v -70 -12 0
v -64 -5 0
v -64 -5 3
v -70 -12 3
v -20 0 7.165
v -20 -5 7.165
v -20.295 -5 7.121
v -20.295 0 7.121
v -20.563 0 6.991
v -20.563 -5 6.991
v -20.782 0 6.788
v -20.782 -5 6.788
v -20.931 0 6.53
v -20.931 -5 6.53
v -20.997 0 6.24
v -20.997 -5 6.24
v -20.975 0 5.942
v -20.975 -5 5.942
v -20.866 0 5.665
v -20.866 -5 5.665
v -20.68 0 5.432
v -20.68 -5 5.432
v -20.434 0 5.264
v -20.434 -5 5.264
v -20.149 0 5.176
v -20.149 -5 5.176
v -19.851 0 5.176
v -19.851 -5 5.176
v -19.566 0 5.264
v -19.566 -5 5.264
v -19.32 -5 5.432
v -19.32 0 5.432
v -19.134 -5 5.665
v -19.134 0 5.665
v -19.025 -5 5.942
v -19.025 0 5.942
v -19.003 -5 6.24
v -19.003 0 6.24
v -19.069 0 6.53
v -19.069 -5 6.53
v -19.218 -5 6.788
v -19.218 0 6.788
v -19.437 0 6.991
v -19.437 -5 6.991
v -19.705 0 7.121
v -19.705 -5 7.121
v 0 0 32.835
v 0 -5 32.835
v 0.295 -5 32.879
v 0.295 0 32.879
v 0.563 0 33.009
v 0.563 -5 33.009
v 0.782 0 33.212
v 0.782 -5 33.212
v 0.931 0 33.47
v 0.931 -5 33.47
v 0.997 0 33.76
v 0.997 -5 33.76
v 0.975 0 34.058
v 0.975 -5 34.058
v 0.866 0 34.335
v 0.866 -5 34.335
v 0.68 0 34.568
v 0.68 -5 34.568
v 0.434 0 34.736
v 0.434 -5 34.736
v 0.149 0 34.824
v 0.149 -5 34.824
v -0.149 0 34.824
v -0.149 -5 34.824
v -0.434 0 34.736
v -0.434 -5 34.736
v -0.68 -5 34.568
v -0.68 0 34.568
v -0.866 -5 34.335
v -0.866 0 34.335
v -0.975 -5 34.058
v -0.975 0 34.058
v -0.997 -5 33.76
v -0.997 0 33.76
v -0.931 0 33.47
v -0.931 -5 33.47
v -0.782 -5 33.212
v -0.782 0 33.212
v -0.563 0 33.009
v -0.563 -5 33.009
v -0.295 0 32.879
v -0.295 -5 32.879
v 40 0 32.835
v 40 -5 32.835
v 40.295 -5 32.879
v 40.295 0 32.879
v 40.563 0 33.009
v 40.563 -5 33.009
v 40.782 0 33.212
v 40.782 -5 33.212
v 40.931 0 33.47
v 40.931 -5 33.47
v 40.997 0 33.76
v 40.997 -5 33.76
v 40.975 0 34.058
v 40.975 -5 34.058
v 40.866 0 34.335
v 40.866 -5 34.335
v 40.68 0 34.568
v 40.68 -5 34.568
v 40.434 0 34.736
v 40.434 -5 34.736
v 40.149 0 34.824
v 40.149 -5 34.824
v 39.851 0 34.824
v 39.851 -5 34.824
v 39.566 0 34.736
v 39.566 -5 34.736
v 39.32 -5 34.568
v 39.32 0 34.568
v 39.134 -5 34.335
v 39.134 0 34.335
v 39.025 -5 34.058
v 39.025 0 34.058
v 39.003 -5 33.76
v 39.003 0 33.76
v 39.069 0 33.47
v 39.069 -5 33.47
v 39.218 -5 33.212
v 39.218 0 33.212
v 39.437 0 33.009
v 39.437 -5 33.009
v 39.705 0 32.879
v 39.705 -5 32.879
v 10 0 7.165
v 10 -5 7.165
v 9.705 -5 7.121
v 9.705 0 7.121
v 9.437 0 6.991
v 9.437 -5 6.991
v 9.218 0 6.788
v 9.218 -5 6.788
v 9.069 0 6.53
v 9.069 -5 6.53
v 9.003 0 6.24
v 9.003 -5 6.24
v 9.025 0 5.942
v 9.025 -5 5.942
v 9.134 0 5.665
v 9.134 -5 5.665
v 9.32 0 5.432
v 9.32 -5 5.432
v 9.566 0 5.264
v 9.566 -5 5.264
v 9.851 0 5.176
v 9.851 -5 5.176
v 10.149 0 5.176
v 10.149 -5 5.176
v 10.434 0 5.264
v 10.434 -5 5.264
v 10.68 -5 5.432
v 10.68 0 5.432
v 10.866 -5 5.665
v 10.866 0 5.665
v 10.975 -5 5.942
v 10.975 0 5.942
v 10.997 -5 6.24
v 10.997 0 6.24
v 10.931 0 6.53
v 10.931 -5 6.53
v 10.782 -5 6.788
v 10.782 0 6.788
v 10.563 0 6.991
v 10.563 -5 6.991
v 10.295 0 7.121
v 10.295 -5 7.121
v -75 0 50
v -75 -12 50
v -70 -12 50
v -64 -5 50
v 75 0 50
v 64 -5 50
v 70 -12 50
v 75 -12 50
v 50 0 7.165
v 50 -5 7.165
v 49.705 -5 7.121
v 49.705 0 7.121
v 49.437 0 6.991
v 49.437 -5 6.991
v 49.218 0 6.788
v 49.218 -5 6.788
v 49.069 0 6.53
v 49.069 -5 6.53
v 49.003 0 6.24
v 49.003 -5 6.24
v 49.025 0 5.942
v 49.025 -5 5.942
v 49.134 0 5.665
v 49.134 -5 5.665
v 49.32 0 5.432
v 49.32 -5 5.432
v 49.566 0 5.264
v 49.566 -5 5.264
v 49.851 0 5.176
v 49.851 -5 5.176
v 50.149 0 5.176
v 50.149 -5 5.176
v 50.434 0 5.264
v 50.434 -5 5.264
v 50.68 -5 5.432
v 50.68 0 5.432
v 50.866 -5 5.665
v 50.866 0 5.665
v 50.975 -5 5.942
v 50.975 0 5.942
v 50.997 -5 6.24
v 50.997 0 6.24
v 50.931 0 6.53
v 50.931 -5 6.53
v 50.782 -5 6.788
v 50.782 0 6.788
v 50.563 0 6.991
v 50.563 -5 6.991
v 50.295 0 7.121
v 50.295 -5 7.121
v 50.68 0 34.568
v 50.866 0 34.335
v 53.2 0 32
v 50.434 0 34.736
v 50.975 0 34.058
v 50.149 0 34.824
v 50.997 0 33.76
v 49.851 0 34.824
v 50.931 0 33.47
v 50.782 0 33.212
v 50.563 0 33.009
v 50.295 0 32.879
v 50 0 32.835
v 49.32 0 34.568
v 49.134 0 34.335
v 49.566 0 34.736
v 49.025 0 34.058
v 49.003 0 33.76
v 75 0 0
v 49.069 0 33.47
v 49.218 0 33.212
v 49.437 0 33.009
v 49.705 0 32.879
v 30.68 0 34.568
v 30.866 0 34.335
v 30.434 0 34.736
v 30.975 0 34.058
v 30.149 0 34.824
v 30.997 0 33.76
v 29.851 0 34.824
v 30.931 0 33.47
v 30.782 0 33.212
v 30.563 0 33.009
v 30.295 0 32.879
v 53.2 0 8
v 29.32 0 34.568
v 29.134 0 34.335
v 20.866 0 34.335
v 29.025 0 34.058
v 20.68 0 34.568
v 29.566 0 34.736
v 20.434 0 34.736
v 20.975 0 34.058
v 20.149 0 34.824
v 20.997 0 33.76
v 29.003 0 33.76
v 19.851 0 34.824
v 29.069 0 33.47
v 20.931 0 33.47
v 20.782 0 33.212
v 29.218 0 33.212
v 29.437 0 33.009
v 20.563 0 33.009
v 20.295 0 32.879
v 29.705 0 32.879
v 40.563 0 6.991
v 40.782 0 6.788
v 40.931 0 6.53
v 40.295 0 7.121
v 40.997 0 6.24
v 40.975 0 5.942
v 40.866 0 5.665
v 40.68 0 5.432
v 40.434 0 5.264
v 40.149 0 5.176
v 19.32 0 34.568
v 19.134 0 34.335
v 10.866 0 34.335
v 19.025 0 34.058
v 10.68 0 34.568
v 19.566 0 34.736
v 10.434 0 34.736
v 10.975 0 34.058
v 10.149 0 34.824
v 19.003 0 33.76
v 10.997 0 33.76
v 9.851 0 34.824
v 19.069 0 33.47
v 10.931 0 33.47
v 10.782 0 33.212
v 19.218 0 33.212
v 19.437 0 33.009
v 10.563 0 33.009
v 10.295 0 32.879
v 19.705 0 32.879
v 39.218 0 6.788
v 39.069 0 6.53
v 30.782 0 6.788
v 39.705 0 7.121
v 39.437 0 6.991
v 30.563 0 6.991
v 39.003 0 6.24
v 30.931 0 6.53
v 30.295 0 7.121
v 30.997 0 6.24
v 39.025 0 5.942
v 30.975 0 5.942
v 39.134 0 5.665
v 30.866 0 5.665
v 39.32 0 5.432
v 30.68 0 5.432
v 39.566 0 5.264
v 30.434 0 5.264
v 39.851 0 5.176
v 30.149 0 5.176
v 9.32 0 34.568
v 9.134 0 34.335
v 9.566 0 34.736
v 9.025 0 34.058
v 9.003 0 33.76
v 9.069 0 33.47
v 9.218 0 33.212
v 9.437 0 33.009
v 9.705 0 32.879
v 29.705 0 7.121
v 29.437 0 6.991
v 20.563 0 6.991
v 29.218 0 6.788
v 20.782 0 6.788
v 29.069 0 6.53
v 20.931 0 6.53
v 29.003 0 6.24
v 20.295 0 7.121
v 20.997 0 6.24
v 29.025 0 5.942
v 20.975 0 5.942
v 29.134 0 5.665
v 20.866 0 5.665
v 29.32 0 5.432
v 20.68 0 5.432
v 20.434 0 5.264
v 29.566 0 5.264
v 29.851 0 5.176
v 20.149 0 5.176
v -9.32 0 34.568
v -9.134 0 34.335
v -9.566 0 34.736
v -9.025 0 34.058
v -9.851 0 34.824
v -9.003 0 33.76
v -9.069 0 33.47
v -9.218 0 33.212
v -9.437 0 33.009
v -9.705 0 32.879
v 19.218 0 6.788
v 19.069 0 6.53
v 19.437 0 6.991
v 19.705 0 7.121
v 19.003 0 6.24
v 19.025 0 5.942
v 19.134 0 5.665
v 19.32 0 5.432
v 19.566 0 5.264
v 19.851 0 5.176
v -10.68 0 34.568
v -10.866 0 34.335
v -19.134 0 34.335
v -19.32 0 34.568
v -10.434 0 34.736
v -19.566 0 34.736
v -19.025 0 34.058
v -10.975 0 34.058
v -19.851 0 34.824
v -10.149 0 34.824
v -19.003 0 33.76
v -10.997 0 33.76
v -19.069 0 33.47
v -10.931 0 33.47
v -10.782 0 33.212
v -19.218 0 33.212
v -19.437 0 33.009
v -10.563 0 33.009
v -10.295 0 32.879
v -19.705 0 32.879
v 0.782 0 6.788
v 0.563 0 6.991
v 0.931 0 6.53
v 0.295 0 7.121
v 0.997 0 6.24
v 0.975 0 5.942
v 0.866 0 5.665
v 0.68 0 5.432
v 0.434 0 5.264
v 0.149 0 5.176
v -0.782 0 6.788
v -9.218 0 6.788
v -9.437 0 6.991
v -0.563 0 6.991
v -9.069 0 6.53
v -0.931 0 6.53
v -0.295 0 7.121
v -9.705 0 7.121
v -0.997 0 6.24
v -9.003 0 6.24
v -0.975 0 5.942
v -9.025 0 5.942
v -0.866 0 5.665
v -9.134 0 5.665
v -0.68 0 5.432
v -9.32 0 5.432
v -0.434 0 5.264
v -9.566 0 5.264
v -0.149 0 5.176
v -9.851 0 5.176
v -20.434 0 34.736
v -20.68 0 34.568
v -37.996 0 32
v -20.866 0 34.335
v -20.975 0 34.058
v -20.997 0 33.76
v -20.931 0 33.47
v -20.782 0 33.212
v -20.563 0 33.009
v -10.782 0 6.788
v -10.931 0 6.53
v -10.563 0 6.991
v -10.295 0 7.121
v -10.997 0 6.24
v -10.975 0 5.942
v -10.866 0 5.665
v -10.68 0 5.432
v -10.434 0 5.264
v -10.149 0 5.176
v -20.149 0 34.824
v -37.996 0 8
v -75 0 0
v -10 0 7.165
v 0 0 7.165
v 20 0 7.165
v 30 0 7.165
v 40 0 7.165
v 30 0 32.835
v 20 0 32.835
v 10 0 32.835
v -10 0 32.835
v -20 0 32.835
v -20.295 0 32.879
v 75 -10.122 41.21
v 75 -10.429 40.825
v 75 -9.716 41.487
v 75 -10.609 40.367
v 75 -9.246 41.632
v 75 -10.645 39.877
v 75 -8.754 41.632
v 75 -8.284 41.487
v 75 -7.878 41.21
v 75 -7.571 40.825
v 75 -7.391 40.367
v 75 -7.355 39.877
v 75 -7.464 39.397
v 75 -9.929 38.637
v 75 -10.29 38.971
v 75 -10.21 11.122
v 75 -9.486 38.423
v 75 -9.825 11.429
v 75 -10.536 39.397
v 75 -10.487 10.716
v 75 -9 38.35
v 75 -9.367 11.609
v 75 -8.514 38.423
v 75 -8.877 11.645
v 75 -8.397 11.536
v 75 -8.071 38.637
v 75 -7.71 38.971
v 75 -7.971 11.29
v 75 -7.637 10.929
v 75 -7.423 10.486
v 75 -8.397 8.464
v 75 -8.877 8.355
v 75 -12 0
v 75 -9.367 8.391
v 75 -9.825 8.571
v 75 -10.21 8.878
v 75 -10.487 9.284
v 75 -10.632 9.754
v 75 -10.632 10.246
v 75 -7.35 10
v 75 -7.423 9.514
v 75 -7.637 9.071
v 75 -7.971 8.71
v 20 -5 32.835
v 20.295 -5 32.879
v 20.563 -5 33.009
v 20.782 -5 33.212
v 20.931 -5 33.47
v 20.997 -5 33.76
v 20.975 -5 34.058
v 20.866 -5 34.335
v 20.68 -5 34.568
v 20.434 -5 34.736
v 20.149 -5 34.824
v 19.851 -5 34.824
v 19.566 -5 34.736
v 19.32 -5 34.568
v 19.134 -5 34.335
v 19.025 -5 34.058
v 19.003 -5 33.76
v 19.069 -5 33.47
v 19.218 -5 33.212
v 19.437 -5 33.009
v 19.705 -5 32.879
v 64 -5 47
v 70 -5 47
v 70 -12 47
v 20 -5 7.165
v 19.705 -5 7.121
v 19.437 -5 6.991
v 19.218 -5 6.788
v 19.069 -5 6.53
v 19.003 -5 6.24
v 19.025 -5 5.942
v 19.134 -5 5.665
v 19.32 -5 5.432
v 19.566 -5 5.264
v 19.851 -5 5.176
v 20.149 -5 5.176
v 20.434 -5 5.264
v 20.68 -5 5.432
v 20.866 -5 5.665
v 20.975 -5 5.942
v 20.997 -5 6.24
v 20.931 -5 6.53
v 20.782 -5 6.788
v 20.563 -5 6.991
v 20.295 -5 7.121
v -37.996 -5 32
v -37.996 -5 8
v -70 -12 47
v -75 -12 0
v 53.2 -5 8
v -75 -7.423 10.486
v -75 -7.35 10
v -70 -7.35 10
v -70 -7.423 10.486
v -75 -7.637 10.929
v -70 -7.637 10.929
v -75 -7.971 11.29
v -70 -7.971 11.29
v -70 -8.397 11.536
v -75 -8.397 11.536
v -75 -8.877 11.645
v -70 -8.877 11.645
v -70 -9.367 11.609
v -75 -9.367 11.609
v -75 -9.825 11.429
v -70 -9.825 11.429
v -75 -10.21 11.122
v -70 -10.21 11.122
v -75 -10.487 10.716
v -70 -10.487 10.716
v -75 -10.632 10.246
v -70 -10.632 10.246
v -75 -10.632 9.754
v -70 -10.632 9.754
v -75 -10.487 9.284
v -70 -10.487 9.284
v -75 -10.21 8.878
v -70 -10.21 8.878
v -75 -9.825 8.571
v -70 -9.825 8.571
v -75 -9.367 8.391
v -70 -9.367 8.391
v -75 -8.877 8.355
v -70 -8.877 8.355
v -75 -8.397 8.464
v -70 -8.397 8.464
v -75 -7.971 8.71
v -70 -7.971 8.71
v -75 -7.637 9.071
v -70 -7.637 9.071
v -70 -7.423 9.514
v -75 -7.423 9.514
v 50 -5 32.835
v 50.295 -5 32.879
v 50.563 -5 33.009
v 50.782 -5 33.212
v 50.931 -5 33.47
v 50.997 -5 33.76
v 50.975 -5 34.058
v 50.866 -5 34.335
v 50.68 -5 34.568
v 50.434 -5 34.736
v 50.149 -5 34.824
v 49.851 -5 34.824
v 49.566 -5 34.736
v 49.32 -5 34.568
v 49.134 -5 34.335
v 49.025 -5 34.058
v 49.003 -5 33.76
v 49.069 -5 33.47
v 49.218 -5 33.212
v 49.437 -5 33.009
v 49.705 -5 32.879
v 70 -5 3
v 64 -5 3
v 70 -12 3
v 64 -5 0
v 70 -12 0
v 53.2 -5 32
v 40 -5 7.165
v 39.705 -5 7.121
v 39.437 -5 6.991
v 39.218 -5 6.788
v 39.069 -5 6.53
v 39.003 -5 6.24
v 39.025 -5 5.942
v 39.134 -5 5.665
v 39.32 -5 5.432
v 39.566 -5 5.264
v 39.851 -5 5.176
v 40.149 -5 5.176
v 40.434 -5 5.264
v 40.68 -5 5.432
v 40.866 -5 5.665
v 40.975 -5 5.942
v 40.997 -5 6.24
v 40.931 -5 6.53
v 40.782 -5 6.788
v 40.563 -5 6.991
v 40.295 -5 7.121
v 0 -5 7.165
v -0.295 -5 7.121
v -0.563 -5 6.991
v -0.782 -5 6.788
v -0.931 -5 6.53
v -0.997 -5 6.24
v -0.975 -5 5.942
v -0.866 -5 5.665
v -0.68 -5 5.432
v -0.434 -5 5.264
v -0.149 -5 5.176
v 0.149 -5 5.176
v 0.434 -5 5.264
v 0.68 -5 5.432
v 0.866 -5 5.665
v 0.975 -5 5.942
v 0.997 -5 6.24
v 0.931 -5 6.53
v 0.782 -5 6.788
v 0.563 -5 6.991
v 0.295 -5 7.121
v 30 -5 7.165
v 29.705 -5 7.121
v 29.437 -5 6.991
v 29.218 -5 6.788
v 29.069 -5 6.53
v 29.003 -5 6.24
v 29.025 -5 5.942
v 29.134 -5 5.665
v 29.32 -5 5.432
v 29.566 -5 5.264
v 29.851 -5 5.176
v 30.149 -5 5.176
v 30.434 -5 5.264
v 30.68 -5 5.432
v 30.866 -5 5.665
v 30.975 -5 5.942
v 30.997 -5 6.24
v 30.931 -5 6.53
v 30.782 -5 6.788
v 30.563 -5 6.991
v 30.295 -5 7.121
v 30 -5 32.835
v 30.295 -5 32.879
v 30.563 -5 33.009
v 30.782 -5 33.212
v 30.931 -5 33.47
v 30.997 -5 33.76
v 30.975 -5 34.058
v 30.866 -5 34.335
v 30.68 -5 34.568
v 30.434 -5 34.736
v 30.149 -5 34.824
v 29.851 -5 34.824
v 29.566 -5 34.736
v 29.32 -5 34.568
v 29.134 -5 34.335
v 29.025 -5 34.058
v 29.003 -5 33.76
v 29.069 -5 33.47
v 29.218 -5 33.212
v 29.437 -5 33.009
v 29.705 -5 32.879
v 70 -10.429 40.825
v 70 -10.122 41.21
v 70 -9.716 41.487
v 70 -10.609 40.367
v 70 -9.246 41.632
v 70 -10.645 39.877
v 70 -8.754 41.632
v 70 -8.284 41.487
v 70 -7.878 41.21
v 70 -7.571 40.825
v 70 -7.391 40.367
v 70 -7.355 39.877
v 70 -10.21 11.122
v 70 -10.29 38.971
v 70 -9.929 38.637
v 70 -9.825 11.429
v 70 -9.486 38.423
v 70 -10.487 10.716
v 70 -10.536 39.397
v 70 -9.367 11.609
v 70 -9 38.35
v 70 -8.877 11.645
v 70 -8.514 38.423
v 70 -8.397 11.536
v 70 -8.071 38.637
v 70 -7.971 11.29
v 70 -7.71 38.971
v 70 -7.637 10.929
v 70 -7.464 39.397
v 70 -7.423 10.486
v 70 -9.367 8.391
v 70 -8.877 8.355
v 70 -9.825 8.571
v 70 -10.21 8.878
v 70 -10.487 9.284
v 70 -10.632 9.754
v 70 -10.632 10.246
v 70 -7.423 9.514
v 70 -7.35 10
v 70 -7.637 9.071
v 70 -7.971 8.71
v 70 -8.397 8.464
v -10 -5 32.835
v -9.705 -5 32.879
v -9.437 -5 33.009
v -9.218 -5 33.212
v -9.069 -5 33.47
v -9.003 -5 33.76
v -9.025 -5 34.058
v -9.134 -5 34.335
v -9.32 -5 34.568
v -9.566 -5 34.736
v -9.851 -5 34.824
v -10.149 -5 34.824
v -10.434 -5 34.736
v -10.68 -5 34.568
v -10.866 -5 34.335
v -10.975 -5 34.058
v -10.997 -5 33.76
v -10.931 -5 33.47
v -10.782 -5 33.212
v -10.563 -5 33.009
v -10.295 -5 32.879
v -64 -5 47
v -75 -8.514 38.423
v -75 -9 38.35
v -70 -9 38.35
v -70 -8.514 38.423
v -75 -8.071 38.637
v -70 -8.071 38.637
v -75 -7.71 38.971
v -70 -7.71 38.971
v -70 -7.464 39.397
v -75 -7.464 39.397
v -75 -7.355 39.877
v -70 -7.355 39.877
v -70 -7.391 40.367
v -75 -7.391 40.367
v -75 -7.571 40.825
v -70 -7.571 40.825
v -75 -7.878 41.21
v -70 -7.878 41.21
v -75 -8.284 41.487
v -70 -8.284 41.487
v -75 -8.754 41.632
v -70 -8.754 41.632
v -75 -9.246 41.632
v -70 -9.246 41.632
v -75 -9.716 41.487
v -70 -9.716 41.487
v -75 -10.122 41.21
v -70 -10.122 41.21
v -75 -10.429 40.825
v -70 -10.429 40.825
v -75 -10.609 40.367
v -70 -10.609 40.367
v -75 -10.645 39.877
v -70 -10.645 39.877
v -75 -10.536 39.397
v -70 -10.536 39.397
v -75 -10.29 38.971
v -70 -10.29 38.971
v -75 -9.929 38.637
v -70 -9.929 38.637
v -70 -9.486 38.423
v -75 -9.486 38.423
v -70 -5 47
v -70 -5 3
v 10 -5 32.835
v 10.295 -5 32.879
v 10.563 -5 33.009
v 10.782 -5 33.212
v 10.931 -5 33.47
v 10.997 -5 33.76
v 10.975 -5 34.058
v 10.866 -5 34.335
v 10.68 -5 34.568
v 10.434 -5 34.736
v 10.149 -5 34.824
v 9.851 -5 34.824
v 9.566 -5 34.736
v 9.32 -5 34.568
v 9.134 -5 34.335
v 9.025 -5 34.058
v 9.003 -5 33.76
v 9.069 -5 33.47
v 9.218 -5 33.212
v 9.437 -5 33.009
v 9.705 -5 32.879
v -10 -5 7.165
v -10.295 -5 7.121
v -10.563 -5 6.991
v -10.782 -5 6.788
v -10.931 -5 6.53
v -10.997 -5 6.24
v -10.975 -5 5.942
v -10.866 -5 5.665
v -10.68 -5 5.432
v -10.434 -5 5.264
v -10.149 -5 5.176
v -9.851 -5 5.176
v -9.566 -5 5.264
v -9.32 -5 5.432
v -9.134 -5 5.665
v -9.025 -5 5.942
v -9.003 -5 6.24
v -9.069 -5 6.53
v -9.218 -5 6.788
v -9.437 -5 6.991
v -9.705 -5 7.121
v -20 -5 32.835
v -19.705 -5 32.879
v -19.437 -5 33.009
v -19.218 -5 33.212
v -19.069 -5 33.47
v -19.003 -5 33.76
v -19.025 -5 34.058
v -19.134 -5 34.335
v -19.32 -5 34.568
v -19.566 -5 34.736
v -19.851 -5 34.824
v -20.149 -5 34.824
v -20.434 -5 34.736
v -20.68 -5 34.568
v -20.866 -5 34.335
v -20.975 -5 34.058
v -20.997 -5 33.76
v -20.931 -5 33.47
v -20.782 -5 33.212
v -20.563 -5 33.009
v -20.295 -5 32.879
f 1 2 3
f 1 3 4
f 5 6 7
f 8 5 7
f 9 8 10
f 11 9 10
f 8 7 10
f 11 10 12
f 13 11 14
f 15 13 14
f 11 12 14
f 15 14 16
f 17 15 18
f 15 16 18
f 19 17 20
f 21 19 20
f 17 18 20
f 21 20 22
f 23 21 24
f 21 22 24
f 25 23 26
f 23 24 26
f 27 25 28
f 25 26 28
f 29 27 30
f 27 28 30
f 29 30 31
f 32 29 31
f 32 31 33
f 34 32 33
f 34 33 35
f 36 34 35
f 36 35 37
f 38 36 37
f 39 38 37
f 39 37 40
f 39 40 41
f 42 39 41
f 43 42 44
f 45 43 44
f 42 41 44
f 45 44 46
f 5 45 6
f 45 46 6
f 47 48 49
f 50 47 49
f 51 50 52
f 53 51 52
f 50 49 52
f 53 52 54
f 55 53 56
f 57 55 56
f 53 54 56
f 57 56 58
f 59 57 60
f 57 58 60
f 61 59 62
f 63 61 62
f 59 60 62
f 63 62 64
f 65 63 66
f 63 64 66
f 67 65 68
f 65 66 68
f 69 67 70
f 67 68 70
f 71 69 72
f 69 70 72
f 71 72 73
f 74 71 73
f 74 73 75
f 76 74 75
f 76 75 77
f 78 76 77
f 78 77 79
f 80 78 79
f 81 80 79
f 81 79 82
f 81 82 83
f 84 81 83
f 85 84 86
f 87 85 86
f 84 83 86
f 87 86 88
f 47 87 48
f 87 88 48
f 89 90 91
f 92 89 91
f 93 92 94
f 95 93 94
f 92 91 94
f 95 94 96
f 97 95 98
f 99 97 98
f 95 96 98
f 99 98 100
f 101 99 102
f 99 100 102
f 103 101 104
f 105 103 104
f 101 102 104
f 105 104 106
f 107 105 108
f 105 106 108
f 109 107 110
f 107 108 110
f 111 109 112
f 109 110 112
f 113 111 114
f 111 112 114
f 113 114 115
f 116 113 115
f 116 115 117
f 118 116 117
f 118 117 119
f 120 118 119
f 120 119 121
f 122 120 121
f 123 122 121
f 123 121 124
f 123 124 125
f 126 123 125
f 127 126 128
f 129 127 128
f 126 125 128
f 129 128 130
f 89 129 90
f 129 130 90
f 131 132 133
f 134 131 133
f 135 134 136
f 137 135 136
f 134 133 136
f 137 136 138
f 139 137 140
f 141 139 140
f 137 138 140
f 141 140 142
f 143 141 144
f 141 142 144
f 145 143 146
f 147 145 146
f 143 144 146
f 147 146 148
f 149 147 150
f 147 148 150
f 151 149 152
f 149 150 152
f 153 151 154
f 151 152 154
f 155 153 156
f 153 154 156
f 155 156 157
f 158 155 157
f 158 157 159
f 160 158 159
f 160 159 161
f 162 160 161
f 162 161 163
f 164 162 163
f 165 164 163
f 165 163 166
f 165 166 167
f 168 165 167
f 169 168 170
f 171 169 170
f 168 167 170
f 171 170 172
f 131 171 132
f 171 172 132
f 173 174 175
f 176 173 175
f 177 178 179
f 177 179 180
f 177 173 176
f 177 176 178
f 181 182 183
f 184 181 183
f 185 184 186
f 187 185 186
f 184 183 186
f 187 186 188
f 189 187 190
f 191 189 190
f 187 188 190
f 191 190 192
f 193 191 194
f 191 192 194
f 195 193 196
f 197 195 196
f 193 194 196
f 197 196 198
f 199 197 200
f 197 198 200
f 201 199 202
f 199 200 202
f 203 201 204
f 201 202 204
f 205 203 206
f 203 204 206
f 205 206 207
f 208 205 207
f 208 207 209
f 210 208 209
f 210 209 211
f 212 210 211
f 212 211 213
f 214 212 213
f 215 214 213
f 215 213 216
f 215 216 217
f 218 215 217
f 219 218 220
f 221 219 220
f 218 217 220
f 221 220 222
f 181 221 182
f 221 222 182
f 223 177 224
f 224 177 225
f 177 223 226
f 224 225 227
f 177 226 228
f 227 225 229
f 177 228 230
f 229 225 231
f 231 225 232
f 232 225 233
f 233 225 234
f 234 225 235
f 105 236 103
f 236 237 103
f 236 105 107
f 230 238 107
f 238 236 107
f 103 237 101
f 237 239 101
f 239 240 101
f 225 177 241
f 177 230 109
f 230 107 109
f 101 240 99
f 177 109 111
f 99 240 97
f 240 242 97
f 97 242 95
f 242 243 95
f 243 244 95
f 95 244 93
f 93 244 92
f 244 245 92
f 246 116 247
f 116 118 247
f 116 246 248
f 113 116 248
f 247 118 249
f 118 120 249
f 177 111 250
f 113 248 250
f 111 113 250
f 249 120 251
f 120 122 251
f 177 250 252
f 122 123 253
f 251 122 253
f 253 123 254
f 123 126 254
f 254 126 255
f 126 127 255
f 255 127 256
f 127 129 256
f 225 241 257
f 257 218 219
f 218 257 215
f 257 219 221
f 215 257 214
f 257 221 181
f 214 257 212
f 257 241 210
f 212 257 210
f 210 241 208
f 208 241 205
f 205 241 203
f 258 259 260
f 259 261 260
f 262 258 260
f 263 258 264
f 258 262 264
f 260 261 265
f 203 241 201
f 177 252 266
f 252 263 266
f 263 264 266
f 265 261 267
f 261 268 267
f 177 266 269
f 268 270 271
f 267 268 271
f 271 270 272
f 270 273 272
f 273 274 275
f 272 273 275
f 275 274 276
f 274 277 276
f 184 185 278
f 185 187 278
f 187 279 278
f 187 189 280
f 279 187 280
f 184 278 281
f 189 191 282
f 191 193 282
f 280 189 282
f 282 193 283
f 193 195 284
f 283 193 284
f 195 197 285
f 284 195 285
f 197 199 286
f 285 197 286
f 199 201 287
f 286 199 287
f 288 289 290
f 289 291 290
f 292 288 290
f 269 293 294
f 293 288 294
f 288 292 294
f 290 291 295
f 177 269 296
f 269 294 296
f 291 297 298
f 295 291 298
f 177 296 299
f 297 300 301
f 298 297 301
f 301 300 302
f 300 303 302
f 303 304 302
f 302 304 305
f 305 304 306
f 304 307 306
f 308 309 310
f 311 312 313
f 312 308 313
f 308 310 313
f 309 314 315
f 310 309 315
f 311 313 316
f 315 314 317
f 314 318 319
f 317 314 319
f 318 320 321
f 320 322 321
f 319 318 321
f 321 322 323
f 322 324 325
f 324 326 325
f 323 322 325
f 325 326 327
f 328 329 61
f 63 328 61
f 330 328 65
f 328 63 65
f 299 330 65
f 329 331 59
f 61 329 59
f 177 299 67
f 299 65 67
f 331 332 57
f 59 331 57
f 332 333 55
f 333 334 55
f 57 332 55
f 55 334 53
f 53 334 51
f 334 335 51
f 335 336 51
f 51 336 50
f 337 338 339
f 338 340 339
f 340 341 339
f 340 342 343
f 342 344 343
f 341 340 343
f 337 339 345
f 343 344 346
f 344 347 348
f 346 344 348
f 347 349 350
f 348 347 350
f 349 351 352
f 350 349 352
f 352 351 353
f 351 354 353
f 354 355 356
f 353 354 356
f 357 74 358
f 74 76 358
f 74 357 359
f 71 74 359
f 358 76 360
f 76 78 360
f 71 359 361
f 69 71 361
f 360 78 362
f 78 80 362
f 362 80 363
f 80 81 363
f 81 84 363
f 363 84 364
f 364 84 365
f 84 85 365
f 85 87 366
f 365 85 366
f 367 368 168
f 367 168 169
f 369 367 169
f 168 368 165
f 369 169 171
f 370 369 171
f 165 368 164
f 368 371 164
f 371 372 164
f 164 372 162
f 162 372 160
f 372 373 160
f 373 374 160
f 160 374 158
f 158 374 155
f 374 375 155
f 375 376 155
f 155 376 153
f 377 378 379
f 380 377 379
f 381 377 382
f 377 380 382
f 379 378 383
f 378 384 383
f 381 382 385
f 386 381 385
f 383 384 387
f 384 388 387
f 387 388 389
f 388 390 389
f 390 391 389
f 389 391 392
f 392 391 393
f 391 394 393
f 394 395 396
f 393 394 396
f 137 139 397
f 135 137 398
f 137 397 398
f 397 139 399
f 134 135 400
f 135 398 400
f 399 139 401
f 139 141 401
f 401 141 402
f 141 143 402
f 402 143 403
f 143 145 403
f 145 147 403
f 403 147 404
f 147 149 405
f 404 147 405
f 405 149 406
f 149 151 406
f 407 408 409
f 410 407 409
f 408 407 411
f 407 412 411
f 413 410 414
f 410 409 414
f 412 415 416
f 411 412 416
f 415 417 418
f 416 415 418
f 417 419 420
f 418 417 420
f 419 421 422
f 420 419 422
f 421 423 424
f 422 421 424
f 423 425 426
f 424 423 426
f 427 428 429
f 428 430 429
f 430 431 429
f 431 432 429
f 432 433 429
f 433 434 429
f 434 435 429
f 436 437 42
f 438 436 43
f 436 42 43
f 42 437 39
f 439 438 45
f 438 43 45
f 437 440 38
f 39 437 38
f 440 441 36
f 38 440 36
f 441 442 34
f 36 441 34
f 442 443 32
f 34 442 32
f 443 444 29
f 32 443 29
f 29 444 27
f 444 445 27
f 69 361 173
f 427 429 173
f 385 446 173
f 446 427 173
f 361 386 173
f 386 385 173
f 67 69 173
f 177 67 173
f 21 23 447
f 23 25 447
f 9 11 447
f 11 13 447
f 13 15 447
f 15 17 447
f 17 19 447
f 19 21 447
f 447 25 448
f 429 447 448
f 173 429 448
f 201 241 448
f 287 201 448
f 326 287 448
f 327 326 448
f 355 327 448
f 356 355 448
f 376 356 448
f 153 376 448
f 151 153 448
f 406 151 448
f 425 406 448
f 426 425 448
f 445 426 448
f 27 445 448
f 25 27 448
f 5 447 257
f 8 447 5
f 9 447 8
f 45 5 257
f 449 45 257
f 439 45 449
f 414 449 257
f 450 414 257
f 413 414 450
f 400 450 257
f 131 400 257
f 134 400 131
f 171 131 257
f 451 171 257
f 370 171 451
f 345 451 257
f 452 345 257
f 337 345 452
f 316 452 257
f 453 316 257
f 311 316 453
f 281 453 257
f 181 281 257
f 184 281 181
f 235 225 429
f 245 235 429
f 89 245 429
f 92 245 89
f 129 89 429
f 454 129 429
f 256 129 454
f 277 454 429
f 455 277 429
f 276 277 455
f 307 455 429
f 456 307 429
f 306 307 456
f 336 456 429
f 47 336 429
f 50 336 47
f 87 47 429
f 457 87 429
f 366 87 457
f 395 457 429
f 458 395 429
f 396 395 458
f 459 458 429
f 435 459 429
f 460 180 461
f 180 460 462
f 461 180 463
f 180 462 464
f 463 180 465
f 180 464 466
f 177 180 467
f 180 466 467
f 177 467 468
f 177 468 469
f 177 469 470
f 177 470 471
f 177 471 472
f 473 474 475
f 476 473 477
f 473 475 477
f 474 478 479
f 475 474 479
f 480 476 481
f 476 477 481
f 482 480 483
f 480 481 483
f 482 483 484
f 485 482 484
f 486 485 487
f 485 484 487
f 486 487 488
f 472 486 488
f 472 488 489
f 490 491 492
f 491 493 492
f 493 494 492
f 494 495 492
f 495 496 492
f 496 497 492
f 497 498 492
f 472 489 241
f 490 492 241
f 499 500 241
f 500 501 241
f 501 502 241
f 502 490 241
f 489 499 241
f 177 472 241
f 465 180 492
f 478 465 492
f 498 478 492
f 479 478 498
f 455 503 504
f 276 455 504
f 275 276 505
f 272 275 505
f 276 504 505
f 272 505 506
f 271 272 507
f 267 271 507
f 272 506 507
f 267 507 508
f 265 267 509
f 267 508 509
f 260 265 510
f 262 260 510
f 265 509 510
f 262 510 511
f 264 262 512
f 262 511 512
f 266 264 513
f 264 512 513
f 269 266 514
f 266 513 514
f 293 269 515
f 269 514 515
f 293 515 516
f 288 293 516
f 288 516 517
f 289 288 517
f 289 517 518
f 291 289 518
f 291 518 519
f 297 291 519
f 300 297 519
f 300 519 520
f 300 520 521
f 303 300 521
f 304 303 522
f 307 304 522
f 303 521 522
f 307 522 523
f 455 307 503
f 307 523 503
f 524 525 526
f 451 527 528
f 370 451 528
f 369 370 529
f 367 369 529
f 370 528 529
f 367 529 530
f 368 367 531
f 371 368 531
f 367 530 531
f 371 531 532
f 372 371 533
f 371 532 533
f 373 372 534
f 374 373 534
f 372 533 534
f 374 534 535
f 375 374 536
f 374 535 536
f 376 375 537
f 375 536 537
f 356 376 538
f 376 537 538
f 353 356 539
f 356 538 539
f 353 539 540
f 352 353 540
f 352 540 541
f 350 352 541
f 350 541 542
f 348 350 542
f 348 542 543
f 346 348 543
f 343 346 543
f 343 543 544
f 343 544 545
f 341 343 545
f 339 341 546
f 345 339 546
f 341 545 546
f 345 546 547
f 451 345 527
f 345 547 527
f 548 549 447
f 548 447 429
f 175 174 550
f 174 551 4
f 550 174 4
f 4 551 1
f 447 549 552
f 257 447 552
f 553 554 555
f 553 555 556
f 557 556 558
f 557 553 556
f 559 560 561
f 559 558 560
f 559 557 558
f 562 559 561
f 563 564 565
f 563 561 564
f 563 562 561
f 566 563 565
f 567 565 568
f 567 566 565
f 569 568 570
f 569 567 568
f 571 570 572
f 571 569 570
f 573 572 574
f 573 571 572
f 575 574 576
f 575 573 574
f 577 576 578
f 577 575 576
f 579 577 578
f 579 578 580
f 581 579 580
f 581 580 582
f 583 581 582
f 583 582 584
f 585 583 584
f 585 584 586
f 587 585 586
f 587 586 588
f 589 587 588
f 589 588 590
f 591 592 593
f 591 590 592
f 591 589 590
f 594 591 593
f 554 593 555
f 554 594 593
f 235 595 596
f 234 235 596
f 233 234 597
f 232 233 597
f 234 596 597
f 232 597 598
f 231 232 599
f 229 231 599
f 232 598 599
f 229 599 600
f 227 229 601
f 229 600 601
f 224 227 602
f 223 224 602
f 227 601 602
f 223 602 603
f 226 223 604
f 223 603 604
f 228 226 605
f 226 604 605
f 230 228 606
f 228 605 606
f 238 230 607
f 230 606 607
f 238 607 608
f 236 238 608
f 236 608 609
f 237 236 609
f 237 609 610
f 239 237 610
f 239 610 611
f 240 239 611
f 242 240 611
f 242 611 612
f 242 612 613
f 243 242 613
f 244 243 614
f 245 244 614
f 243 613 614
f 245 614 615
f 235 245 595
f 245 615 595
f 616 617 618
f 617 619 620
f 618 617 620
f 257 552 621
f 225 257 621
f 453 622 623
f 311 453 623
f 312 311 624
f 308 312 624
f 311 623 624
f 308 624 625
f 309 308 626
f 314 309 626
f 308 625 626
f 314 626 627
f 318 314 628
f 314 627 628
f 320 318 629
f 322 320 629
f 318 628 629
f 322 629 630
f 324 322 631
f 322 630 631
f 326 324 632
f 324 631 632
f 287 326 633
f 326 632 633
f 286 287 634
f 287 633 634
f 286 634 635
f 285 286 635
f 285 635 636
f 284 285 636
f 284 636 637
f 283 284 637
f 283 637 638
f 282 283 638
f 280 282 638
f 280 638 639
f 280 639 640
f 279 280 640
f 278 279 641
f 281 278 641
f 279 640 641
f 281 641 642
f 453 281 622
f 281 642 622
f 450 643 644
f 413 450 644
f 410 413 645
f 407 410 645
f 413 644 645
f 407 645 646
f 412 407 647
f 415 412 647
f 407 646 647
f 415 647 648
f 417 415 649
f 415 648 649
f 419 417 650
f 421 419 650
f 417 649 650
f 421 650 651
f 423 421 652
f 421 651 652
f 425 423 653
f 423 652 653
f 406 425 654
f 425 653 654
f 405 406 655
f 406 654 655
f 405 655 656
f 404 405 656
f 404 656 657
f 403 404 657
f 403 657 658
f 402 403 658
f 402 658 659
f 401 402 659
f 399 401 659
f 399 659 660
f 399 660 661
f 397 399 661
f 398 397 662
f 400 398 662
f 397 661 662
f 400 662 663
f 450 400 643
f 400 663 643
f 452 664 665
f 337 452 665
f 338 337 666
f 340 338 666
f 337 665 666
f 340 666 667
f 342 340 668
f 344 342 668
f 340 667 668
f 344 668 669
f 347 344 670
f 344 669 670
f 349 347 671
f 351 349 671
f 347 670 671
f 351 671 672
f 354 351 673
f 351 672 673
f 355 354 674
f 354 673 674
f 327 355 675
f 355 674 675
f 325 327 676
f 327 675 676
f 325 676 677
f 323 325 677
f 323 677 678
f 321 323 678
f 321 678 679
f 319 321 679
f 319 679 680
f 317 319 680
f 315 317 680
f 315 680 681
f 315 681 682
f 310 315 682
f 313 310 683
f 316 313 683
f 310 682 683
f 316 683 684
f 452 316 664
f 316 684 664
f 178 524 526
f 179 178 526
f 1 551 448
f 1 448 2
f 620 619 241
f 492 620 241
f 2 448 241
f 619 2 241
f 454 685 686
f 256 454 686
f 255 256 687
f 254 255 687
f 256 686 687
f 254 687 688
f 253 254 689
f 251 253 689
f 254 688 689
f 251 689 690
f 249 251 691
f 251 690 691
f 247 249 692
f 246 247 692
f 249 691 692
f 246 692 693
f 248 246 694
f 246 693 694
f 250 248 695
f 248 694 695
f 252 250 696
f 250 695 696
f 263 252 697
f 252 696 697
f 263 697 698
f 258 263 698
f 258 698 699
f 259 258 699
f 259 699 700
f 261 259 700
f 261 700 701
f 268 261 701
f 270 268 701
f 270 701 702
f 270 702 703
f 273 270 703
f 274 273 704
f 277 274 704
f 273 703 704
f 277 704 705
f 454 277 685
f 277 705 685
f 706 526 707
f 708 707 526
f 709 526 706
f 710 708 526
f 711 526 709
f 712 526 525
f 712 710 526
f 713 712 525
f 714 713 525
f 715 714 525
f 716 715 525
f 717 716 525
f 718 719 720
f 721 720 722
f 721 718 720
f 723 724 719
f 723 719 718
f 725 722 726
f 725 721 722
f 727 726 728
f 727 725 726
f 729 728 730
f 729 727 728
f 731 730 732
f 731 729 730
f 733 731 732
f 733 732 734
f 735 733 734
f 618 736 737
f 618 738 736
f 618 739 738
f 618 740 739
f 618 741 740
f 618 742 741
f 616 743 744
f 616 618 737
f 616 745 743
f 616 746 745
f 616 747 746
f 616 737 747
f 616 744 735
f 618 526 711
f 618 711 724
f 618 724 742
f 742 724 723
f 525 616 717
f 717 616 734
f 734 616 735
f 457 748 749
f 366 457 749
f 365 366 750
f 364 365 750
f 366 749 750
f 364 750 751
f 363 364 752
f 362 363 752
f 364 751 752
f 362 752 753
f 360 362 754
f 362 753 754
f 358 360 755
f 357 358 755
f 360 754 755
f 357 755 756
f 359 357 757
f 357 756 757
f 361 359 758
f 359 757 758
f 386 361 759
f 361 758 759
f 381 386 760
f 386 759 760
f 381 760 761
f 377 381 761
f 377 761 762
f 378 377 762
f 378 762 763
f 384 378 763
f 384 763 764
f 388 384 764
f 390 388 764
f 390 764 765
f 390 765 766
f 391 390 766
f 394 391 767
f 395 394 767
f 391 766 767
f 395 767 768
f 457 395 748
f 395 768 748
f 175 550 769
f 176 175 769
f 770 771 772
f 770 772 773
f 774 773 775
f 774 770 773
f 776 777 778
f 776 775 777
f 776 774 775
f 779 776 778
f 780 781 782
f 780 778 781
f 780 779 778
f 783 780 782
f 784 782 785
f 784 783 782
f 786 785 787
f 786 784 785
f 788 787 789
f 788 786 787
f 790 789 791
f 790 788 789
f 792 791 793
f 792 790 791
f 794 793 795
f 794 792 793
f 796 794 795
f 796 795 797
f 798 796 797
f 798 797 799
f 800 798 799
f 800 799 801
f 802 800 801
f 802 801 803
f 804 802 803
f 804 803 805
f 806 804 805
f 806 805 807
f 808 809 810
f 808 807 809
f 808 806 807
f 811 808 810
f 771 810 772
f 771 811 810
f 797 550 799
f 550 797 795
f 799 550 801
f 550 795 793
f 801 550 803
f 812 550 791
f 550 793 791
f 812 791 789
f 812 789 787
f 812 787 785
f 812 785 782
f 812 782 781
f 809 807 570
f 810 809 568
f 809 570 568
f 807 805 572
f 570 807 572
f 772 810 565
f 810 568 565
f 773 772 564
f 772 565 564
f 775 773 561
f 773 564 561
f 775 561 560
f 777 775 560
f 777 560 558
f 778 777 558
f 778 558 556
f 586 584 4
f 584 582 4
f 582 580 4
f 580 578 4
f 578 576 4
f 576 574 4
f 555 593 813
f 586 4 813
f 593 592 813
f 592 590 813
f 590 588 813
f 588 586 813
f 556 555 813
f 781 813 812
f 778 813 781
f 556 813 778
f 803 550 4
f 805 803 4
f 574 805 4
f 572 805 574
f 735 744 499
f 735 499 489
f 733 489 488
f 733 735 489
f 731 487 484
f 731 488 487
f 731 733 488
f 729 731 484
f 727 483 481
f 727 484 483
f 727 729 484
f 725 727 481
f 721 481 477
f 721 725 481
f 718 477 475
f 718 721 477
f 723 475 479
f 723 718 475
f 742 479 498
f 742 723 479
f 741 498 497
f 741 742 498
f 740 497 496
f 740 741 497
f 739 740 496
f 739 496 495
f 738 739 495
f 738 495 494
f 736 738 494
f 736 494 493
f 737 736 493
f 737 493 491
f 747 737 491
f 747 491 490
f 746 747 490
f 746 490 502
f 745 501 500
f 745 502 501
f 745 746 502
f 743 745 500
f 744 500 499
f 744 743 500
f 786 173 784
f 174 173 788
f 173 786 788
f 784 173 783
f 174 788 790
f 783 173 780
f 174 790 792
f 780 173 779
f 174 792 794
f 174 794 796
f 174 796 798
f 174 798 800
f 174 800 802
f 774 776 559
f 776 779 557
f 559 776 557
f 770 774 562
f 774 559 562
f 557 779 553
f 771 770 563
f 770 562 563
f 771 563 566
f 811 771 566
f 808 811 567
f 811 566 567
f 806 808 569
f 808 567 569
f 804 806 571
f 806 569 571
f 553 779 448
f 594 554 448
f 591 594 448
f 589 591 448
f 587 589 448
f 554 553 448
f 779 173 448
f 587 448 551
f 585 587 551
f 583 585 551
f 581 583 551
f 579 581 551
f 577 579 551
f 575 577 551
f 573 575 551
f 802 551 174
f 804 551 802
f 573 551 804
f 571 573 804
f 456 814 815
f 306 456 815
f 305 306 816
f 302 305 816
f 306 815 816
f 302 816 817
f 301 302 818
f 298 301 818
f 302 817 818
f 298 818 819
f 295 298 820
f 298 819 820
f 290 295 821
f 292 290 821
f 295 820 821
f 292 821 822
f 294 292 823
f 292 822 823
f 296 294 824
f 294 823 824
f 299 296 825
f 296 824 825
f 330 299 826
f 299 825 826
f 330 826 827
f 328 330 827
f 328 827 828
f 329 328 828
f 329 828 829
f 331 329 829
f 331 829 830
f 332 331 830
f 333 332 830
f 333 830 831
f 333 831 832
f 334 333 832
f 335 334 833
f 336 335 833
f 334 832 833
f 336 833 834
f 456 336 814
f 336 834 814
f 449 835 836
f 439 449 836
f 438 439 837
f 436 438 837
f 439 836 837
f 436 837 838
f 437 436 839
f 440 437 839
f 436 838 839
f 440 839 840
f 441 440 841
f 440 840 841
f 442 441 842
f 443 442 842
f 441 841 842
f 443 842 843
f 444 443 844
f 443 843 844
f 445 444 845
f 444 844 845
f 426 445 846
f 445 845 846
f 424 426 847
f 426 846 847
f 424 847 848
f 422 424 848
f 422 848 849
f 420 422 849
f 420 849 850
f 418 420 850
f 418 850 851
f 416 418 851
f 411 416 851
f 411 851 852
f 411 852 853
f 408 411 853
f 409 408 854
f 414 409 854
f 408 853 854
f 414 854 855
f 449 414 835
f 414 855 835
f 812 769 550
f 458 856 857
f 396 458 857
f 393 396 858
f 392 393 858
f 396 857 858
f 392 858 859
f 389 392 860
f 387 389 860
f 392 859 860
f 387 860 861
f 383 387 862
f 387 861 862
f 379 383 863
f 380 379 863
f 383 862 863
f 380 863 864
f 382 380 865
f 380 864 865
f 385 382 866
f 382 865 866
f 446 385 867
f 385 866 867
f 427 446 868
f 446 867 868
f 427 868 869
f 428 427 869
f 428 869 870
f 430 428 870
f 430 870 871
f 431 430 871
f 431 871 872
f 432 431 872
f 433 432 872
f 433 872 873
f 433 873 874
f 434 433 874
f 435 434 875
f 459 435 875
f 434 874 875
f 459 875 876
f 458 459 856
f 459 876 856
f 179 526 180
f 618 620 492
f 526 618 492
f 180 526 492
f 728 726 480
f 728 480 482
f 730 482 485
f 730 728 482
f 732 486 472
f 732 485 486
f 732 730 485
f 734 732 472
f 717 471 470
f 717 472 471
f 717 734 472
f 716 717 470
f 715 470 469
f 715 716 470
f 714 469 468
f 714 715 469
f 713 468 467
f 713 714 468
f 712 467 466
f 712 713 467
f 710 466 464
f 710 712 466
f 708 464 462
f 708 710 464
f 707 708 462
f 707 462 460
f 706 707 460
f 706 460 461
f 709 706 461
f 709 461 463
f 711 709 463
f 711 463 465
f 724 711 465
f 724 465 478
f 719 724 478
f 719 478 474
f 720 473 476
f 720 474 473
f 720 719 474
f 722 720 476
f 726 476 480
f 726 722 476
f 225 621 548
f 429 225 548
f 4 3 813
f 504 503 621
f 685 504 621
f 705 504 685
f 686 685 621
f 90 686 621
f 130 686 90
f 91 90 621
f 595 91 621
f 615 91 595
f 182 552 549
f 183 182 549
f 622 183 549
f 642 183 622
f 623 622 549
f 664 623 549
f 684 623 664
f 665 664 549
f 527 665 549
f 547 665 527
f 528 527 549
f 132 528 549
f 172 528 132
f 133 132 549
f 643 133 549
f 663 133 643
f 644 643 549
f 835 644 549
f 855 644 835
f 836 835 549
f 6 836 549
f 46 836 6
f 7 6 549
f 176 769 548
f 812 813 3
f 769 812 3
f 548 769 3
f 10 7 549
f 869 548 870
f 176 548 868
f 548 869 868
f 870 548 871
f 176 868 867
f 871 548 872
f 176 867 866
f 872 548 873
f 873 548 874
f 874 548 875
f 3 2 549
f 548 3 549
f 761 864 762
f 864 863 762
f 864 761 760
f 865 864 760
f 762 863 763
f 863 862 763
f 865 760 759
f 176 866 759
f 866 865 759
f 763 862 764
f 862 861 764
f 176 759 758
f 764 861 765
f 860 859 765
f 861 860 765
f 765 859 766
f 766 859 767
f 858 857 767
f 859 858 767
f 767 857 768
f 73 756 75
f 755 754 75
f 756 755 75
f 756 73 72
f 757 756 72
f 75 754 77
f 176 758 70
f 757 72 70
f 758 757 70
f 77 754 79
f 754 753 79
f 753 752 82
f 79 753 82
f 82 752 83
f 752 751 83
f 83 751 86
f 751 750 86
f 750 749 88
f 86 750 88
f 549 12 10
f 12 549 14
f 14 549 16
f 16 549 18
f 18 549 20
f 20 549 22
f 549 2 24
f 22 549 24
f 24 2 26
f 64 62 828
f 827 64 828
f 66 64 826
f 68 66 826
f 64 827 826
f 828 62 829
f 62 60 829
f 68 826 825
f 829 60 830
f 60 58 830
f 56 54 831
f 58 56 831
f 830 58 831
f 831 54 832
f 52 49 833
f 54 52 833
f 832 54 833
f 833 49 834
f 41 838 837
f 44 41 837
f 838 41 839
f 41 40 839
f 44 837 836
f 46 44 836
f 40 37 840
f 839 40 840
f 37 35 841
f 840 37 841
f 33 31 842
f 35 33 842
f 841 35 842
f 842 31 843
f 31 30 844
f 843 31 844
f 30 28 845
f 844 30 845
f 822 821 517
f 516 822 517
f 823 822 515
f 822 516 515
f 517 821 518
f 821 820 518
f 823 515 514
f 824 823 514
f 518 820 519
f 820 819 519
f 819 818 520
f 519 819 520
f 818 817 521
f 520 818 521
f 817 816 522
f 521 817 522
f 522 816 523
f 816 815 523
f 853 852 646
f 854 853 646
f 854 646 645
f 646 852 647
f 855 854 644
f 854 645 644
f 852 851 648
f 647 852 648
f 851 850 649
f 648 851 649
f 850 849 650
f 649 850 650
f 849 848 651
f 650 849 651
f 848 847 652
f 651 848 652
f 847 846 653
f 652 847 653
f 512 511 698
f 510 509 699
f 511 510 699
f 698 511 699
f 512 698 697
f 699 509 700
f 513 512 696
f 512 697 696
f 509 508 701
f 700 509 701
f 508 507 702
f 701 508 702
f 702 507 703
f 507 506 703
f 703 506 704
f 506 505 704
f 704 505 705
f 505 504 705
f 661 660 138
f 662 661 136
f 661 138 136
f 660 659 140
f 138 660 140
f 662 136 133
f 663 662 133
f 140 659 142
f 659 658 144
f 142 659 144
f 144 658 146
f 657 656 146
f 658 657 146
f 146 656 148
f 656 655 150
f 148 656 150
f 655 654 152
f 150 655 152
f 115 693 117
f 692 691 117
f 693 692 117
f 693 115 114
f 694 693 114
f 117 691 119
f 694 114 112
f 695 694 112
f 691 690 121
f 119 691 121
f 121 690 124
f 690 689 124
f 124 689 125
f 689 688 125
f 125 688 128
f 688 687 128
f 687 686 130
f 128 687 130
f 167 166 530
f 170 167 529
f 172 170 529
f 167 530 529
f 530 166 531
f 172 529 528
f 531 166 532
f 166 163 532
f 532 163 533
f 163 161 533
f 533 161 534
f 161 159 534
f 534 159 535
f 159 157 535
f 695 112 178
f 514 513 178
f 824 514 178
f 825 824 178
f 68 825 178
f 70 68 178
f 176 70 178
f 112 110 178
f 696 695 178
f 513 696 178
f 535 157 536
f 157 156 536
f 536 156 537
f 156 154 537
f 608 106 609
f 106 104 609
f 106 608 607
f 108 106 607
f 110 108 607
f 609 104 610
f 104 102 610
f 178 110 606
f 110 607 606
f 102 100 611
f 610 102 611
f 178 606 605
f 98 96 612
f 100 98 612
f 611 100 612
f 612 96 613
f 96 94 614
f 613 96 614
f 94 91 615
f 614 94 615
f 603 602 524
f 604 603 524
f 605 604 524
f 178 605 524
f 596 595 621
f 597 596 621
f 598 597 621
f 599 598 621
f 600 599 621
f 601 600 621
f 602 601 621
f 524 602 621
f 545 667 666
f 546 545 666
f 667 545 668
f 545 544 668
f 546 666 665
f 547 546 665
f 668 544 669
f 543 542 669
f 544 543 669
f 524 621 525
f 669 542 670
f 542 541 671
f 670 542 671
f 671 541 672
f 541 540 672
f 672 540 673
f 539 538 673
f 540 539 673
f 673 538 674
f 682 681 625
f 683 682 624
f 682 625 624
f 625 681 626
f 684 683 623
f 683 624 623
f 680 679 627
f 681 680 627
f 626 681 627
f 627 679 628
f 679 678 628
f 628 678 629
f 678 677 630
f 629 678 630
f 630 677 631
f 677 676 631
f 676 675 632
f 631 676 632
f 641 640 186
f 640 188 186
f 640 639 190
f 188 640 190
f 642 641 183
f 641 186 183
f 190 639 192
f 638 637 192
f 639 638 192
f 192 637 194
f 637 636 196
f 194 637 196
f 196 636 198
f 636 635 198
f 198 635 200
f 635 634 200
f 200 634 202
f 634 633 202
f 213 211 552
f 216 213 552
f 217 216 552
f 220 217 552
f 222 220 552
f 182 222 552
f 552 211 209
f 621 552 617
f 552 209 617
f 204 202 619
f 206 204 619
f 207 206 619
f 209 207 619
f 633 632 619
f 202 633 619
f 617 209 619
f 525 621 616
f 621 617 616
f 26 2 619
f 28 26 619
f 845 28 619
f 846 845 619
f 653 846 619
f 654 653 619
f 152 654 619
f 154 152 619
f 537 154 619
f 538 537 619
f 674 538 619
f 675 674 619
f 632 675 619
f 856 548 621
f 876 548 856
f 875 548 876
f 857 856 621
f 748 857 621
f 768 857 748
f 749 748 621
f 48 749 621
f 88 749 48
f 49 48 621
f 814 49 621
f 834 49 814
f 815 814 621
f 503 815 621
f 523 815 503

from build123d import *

# Parameters (mm, degrees)
EXTRUDE_2_DEPTH                 = 40
CUT_EXTRUDE_1_DEPTH             = 151.894002532
CUT_EXTRUDE_1_DEPTH_BACK        = 151.894002532
SKETCH_3_R                      = 1.65
EXTRUDE_3_DEPTH                 = 3
MIRROR_2_COPY_1_DEPTH           = 3
CUT_EXTRUDE_2_DEPTH             = 5
SKETCH_10_R                     = 1
CUT_EXTRUDE_3_DEPTH             = 5
EXTRUDE_4_DEPTH                 = 10
CUT_EXTRUDE_4_REACH             = 87.843
CUT_EXTRUDE_4_DIRECTION_2_DEPTH = 7
CUT_EXTRUDE_5_DEPTH             = 91.93404203
CUT_EXTRUDE_5_DEPTH_BACK        = 91.93404203
SKETCH_12_R                     = 1.65


with BuildPart() as part:
    # 草图1 → 凸台-拉伸2 (new body)
    with BuildSketch(Plane.XY):
        Polygon((-75, 0), (75, 0), (75, -12), (70, -12), (70, -5), (-70, -5), (-70, -12), (-75, -12), align=None)
    extrude(amount=EXTRUDE_2_DEPTH)

    # 草图3 → 切除-拉伸1 (cut, two sides: drawn at the far end of the back side and taken through both)
    with BuildSketch(Plane(origin=(-70, 0, 0), x_dir=(0, 0, -1), z_dir=(1, 0, 0)).offset(-CUT_EXTRUDE_1_DEPTH_BACK)):
        with Locations(Location((-10, -9, 0), (0, 0, 90))):
            Circle(SKETCH_3_R)
    extrude(amount=CUT_EXTRUDE_1_DEPTH + CUT_EXTRUDE_1_DEPTH_BACK, mode=Mode.SUBTRACT)

    # 草图4 → 凸台-拉伸3 (add)
    with BuildSketch(Plane(origin=(0, 0, 0), x_dir=(-1, 0, 0), z_dir=(0, 0, -1))):
        Polygon((64, -5), (70, -12), (70, -5), align=None)
    extrude_3 = extrude(amount=-EXTRUDE_3_DEPTH)

    # 镜向1: 凸台-拉伸3 across plane
    add(extrude_3.mirror(Plane.XY.offset(20)))

    # 镜向2: 凸台-拉伸3 across plane
    add(extrude_3.mirror(Plane(origin=(0, 0, 0), x_dir=(0, 0, 1), z_dir=(1, 0, 0))))

    # 镜向2 copy 1 sketch → 镜向2 copy 1 (add)
    with BuildSketch(Plane.XY.offset(40)):
        Polygon((64, -5), (70, -12), (70, -5), align=None)
    extrude(amount=-MIRROR_2_COPY_1_DEPTH)

    # 草图7 → 切除-拉伸2 (cut)
    with BuildSketch(Plane.XZ.offset(5)):
        Polygon((53.2, 22.4), (53.2, 17.6), (53.2, 8), (34, 8), (-37.996196674, 8), (-37.996196674, 32), (34, 32), (53.2, 32), align=None)
    extrude(amount=-CUT_EXTRUDE_2_DEPTH, mode=Mode.SUBTRACT)

    # 草图10 → 切除-拉伸3 (cut)
    with BuildSketch(Plane.XZ.offset(5)):
        with Locations(Location((50, 33.835, 0), (0, 0, 270))):
            Circle(SKETCH_10_R)
        with Locations(Location((40, 33.835, 0), (0, 0, 270))):
            Circle(SKETCH_10_R)
        with Locations(Location((30, 33.835, 0), (0, 0, 270))):
            Circle(SKETCH_10_R)
        with Locations(Location((20, 33.835, 0), (0, 0, 270))):
            Circle(SKETCH_10_R)
        with Locations(Location((10, 33.835, 0), (0, 0, 270))):
            Circle(SKETCH_10_R)
        with Locations(Location((0, 33.835, 0), (0, 0, 270))):
            Circle(SKETCH_10_R)
        with Locations(Location((-10, 33.835, 0), (0, 0, 270))):
            Circle(SKETCH_10_R)
        with Locations(Location((-20, 33.835, 0), (0, 0, 270))):
            Circle(SKETCH_10_R)
        with Locations(Location((50, 6.165, 0), (0, 0, 90))):
            Circle(SKETCH_10_R)
        with Locations(Location((40, 6.165, 0), (0, 0, 90))):
            Circle(SKETCH_10_R)
        with Locations(Location((30, 6.165, 0), (0, 0, 90))):
            Circle(SKETCH_10_R)
        with Locations(Location((20, 6.165, 0), (0, 0, 90))):
            Circle(SKETCH_10_R)
        with Locations(Location((10, 6.165, 0), (0, 0, 90))):
            Circle(SKETCH_10_R)
        with Locations(Location((0, 6.165, 0), (0, 0, 90))):
            Circle(SKETCH_10_R)
        with Locations(Location((-10, 6.165, 0), (0, 0, 90))):
            Circle(SKETCH_10_R)
        with Locations(Location((-20, 6.165, 0), (0, 0, 90))):
            Circle(SKETCH_10_R)
    extrude(amount=-CUT_EXTRUDE_3_DEPTH, mode=Mode.SUBTRACT)

    # 草图11 → 凸台-拉伸4 (add)
    with BuildSketch(Plane.XY.offset(40)):
        Polygon((-75, -12), (-70, -12), (-64, -5), (64, -5), (70, -12), (75, -12), (75, 0), (-75, 0), align=None)
    extrude(amount=EXTRUDE_4_DEPTH)

    # 草图11<3> → 切除-拉伸4 (cut, up to next)
    with BuildSketch(Plane.XY.offset(40), mode=Mode.PRIVATE) as cut_extrude_4_sk1:
        Polygon((-70, -12), (-70, -5), (-64, -5), align=None)
    cut_extrude_4_tool1 = extrude(cut_extrude_4_sk1.sketch, amount=-CUT_EXTRUDE_4_REACH, mode=Mode.PRIVATE) & part.part
    # 草图11<3> → 切除-拉伸4 (cut, up to next)
    with BuildSketch(Plane.XY.offset(40), mode=Mode.PRIVATE) as cut_extrude_4_sk2:
        Polygon((64, -5), (70, -5), (70, -12), align=None)
    cut_extrude_4_tool2 = extrude(cut_extrude_4_sk2.sketch, amount=-CUT_EXTRUDE_4_REACH, mode=Mode.PRIVATE) & part.part
    add(cut_extrude_4_tool1.solids().sort_by_distance((-68, -7.333333, 40))[0], mode=Mode.SUBTRACT)
    add(cut_extrude_4_tool2.solids().sort_by_distance((68, -7.333333, 40))[0], mode=Mode.SUBTRACT)

    # 草图11<3> → 切除-拉伸4 direction 2 (cut)
    with BuildSketch(Plane.XY.offset(40)):
        Polygon((-70, -12), (-70, -5), (-64, -5), align=None)
        Polygon((64, -5), (70, -5), (70, -12), align=None)
    extrude(amount=CUT_EXTRUDE_4_DIRECTION_2_DEPTH, mode=Mode.SUBTRACT)

    # 草图12 → 切除-拉伸5 (cut, two sides: drawn at the far end of the back side and taken through both)
    with BuildSketch(Plane(origin=(0, 0, 0), x_dir=(0, 0, -1), z_dir=(1, 0, 0)).offset(-CUT_EXTRUDE_5_DEPTH_BACK)):
        with Locations((-40, -9)):
            Circle(SKETCH_12_R)
    extrude(amount=CUT_EXTRUDE_5_DEPTH + CUT_EXTRUDE_5_DEPTH_BACK, mode=Mode.SUBTRACT)


solid = part.part
